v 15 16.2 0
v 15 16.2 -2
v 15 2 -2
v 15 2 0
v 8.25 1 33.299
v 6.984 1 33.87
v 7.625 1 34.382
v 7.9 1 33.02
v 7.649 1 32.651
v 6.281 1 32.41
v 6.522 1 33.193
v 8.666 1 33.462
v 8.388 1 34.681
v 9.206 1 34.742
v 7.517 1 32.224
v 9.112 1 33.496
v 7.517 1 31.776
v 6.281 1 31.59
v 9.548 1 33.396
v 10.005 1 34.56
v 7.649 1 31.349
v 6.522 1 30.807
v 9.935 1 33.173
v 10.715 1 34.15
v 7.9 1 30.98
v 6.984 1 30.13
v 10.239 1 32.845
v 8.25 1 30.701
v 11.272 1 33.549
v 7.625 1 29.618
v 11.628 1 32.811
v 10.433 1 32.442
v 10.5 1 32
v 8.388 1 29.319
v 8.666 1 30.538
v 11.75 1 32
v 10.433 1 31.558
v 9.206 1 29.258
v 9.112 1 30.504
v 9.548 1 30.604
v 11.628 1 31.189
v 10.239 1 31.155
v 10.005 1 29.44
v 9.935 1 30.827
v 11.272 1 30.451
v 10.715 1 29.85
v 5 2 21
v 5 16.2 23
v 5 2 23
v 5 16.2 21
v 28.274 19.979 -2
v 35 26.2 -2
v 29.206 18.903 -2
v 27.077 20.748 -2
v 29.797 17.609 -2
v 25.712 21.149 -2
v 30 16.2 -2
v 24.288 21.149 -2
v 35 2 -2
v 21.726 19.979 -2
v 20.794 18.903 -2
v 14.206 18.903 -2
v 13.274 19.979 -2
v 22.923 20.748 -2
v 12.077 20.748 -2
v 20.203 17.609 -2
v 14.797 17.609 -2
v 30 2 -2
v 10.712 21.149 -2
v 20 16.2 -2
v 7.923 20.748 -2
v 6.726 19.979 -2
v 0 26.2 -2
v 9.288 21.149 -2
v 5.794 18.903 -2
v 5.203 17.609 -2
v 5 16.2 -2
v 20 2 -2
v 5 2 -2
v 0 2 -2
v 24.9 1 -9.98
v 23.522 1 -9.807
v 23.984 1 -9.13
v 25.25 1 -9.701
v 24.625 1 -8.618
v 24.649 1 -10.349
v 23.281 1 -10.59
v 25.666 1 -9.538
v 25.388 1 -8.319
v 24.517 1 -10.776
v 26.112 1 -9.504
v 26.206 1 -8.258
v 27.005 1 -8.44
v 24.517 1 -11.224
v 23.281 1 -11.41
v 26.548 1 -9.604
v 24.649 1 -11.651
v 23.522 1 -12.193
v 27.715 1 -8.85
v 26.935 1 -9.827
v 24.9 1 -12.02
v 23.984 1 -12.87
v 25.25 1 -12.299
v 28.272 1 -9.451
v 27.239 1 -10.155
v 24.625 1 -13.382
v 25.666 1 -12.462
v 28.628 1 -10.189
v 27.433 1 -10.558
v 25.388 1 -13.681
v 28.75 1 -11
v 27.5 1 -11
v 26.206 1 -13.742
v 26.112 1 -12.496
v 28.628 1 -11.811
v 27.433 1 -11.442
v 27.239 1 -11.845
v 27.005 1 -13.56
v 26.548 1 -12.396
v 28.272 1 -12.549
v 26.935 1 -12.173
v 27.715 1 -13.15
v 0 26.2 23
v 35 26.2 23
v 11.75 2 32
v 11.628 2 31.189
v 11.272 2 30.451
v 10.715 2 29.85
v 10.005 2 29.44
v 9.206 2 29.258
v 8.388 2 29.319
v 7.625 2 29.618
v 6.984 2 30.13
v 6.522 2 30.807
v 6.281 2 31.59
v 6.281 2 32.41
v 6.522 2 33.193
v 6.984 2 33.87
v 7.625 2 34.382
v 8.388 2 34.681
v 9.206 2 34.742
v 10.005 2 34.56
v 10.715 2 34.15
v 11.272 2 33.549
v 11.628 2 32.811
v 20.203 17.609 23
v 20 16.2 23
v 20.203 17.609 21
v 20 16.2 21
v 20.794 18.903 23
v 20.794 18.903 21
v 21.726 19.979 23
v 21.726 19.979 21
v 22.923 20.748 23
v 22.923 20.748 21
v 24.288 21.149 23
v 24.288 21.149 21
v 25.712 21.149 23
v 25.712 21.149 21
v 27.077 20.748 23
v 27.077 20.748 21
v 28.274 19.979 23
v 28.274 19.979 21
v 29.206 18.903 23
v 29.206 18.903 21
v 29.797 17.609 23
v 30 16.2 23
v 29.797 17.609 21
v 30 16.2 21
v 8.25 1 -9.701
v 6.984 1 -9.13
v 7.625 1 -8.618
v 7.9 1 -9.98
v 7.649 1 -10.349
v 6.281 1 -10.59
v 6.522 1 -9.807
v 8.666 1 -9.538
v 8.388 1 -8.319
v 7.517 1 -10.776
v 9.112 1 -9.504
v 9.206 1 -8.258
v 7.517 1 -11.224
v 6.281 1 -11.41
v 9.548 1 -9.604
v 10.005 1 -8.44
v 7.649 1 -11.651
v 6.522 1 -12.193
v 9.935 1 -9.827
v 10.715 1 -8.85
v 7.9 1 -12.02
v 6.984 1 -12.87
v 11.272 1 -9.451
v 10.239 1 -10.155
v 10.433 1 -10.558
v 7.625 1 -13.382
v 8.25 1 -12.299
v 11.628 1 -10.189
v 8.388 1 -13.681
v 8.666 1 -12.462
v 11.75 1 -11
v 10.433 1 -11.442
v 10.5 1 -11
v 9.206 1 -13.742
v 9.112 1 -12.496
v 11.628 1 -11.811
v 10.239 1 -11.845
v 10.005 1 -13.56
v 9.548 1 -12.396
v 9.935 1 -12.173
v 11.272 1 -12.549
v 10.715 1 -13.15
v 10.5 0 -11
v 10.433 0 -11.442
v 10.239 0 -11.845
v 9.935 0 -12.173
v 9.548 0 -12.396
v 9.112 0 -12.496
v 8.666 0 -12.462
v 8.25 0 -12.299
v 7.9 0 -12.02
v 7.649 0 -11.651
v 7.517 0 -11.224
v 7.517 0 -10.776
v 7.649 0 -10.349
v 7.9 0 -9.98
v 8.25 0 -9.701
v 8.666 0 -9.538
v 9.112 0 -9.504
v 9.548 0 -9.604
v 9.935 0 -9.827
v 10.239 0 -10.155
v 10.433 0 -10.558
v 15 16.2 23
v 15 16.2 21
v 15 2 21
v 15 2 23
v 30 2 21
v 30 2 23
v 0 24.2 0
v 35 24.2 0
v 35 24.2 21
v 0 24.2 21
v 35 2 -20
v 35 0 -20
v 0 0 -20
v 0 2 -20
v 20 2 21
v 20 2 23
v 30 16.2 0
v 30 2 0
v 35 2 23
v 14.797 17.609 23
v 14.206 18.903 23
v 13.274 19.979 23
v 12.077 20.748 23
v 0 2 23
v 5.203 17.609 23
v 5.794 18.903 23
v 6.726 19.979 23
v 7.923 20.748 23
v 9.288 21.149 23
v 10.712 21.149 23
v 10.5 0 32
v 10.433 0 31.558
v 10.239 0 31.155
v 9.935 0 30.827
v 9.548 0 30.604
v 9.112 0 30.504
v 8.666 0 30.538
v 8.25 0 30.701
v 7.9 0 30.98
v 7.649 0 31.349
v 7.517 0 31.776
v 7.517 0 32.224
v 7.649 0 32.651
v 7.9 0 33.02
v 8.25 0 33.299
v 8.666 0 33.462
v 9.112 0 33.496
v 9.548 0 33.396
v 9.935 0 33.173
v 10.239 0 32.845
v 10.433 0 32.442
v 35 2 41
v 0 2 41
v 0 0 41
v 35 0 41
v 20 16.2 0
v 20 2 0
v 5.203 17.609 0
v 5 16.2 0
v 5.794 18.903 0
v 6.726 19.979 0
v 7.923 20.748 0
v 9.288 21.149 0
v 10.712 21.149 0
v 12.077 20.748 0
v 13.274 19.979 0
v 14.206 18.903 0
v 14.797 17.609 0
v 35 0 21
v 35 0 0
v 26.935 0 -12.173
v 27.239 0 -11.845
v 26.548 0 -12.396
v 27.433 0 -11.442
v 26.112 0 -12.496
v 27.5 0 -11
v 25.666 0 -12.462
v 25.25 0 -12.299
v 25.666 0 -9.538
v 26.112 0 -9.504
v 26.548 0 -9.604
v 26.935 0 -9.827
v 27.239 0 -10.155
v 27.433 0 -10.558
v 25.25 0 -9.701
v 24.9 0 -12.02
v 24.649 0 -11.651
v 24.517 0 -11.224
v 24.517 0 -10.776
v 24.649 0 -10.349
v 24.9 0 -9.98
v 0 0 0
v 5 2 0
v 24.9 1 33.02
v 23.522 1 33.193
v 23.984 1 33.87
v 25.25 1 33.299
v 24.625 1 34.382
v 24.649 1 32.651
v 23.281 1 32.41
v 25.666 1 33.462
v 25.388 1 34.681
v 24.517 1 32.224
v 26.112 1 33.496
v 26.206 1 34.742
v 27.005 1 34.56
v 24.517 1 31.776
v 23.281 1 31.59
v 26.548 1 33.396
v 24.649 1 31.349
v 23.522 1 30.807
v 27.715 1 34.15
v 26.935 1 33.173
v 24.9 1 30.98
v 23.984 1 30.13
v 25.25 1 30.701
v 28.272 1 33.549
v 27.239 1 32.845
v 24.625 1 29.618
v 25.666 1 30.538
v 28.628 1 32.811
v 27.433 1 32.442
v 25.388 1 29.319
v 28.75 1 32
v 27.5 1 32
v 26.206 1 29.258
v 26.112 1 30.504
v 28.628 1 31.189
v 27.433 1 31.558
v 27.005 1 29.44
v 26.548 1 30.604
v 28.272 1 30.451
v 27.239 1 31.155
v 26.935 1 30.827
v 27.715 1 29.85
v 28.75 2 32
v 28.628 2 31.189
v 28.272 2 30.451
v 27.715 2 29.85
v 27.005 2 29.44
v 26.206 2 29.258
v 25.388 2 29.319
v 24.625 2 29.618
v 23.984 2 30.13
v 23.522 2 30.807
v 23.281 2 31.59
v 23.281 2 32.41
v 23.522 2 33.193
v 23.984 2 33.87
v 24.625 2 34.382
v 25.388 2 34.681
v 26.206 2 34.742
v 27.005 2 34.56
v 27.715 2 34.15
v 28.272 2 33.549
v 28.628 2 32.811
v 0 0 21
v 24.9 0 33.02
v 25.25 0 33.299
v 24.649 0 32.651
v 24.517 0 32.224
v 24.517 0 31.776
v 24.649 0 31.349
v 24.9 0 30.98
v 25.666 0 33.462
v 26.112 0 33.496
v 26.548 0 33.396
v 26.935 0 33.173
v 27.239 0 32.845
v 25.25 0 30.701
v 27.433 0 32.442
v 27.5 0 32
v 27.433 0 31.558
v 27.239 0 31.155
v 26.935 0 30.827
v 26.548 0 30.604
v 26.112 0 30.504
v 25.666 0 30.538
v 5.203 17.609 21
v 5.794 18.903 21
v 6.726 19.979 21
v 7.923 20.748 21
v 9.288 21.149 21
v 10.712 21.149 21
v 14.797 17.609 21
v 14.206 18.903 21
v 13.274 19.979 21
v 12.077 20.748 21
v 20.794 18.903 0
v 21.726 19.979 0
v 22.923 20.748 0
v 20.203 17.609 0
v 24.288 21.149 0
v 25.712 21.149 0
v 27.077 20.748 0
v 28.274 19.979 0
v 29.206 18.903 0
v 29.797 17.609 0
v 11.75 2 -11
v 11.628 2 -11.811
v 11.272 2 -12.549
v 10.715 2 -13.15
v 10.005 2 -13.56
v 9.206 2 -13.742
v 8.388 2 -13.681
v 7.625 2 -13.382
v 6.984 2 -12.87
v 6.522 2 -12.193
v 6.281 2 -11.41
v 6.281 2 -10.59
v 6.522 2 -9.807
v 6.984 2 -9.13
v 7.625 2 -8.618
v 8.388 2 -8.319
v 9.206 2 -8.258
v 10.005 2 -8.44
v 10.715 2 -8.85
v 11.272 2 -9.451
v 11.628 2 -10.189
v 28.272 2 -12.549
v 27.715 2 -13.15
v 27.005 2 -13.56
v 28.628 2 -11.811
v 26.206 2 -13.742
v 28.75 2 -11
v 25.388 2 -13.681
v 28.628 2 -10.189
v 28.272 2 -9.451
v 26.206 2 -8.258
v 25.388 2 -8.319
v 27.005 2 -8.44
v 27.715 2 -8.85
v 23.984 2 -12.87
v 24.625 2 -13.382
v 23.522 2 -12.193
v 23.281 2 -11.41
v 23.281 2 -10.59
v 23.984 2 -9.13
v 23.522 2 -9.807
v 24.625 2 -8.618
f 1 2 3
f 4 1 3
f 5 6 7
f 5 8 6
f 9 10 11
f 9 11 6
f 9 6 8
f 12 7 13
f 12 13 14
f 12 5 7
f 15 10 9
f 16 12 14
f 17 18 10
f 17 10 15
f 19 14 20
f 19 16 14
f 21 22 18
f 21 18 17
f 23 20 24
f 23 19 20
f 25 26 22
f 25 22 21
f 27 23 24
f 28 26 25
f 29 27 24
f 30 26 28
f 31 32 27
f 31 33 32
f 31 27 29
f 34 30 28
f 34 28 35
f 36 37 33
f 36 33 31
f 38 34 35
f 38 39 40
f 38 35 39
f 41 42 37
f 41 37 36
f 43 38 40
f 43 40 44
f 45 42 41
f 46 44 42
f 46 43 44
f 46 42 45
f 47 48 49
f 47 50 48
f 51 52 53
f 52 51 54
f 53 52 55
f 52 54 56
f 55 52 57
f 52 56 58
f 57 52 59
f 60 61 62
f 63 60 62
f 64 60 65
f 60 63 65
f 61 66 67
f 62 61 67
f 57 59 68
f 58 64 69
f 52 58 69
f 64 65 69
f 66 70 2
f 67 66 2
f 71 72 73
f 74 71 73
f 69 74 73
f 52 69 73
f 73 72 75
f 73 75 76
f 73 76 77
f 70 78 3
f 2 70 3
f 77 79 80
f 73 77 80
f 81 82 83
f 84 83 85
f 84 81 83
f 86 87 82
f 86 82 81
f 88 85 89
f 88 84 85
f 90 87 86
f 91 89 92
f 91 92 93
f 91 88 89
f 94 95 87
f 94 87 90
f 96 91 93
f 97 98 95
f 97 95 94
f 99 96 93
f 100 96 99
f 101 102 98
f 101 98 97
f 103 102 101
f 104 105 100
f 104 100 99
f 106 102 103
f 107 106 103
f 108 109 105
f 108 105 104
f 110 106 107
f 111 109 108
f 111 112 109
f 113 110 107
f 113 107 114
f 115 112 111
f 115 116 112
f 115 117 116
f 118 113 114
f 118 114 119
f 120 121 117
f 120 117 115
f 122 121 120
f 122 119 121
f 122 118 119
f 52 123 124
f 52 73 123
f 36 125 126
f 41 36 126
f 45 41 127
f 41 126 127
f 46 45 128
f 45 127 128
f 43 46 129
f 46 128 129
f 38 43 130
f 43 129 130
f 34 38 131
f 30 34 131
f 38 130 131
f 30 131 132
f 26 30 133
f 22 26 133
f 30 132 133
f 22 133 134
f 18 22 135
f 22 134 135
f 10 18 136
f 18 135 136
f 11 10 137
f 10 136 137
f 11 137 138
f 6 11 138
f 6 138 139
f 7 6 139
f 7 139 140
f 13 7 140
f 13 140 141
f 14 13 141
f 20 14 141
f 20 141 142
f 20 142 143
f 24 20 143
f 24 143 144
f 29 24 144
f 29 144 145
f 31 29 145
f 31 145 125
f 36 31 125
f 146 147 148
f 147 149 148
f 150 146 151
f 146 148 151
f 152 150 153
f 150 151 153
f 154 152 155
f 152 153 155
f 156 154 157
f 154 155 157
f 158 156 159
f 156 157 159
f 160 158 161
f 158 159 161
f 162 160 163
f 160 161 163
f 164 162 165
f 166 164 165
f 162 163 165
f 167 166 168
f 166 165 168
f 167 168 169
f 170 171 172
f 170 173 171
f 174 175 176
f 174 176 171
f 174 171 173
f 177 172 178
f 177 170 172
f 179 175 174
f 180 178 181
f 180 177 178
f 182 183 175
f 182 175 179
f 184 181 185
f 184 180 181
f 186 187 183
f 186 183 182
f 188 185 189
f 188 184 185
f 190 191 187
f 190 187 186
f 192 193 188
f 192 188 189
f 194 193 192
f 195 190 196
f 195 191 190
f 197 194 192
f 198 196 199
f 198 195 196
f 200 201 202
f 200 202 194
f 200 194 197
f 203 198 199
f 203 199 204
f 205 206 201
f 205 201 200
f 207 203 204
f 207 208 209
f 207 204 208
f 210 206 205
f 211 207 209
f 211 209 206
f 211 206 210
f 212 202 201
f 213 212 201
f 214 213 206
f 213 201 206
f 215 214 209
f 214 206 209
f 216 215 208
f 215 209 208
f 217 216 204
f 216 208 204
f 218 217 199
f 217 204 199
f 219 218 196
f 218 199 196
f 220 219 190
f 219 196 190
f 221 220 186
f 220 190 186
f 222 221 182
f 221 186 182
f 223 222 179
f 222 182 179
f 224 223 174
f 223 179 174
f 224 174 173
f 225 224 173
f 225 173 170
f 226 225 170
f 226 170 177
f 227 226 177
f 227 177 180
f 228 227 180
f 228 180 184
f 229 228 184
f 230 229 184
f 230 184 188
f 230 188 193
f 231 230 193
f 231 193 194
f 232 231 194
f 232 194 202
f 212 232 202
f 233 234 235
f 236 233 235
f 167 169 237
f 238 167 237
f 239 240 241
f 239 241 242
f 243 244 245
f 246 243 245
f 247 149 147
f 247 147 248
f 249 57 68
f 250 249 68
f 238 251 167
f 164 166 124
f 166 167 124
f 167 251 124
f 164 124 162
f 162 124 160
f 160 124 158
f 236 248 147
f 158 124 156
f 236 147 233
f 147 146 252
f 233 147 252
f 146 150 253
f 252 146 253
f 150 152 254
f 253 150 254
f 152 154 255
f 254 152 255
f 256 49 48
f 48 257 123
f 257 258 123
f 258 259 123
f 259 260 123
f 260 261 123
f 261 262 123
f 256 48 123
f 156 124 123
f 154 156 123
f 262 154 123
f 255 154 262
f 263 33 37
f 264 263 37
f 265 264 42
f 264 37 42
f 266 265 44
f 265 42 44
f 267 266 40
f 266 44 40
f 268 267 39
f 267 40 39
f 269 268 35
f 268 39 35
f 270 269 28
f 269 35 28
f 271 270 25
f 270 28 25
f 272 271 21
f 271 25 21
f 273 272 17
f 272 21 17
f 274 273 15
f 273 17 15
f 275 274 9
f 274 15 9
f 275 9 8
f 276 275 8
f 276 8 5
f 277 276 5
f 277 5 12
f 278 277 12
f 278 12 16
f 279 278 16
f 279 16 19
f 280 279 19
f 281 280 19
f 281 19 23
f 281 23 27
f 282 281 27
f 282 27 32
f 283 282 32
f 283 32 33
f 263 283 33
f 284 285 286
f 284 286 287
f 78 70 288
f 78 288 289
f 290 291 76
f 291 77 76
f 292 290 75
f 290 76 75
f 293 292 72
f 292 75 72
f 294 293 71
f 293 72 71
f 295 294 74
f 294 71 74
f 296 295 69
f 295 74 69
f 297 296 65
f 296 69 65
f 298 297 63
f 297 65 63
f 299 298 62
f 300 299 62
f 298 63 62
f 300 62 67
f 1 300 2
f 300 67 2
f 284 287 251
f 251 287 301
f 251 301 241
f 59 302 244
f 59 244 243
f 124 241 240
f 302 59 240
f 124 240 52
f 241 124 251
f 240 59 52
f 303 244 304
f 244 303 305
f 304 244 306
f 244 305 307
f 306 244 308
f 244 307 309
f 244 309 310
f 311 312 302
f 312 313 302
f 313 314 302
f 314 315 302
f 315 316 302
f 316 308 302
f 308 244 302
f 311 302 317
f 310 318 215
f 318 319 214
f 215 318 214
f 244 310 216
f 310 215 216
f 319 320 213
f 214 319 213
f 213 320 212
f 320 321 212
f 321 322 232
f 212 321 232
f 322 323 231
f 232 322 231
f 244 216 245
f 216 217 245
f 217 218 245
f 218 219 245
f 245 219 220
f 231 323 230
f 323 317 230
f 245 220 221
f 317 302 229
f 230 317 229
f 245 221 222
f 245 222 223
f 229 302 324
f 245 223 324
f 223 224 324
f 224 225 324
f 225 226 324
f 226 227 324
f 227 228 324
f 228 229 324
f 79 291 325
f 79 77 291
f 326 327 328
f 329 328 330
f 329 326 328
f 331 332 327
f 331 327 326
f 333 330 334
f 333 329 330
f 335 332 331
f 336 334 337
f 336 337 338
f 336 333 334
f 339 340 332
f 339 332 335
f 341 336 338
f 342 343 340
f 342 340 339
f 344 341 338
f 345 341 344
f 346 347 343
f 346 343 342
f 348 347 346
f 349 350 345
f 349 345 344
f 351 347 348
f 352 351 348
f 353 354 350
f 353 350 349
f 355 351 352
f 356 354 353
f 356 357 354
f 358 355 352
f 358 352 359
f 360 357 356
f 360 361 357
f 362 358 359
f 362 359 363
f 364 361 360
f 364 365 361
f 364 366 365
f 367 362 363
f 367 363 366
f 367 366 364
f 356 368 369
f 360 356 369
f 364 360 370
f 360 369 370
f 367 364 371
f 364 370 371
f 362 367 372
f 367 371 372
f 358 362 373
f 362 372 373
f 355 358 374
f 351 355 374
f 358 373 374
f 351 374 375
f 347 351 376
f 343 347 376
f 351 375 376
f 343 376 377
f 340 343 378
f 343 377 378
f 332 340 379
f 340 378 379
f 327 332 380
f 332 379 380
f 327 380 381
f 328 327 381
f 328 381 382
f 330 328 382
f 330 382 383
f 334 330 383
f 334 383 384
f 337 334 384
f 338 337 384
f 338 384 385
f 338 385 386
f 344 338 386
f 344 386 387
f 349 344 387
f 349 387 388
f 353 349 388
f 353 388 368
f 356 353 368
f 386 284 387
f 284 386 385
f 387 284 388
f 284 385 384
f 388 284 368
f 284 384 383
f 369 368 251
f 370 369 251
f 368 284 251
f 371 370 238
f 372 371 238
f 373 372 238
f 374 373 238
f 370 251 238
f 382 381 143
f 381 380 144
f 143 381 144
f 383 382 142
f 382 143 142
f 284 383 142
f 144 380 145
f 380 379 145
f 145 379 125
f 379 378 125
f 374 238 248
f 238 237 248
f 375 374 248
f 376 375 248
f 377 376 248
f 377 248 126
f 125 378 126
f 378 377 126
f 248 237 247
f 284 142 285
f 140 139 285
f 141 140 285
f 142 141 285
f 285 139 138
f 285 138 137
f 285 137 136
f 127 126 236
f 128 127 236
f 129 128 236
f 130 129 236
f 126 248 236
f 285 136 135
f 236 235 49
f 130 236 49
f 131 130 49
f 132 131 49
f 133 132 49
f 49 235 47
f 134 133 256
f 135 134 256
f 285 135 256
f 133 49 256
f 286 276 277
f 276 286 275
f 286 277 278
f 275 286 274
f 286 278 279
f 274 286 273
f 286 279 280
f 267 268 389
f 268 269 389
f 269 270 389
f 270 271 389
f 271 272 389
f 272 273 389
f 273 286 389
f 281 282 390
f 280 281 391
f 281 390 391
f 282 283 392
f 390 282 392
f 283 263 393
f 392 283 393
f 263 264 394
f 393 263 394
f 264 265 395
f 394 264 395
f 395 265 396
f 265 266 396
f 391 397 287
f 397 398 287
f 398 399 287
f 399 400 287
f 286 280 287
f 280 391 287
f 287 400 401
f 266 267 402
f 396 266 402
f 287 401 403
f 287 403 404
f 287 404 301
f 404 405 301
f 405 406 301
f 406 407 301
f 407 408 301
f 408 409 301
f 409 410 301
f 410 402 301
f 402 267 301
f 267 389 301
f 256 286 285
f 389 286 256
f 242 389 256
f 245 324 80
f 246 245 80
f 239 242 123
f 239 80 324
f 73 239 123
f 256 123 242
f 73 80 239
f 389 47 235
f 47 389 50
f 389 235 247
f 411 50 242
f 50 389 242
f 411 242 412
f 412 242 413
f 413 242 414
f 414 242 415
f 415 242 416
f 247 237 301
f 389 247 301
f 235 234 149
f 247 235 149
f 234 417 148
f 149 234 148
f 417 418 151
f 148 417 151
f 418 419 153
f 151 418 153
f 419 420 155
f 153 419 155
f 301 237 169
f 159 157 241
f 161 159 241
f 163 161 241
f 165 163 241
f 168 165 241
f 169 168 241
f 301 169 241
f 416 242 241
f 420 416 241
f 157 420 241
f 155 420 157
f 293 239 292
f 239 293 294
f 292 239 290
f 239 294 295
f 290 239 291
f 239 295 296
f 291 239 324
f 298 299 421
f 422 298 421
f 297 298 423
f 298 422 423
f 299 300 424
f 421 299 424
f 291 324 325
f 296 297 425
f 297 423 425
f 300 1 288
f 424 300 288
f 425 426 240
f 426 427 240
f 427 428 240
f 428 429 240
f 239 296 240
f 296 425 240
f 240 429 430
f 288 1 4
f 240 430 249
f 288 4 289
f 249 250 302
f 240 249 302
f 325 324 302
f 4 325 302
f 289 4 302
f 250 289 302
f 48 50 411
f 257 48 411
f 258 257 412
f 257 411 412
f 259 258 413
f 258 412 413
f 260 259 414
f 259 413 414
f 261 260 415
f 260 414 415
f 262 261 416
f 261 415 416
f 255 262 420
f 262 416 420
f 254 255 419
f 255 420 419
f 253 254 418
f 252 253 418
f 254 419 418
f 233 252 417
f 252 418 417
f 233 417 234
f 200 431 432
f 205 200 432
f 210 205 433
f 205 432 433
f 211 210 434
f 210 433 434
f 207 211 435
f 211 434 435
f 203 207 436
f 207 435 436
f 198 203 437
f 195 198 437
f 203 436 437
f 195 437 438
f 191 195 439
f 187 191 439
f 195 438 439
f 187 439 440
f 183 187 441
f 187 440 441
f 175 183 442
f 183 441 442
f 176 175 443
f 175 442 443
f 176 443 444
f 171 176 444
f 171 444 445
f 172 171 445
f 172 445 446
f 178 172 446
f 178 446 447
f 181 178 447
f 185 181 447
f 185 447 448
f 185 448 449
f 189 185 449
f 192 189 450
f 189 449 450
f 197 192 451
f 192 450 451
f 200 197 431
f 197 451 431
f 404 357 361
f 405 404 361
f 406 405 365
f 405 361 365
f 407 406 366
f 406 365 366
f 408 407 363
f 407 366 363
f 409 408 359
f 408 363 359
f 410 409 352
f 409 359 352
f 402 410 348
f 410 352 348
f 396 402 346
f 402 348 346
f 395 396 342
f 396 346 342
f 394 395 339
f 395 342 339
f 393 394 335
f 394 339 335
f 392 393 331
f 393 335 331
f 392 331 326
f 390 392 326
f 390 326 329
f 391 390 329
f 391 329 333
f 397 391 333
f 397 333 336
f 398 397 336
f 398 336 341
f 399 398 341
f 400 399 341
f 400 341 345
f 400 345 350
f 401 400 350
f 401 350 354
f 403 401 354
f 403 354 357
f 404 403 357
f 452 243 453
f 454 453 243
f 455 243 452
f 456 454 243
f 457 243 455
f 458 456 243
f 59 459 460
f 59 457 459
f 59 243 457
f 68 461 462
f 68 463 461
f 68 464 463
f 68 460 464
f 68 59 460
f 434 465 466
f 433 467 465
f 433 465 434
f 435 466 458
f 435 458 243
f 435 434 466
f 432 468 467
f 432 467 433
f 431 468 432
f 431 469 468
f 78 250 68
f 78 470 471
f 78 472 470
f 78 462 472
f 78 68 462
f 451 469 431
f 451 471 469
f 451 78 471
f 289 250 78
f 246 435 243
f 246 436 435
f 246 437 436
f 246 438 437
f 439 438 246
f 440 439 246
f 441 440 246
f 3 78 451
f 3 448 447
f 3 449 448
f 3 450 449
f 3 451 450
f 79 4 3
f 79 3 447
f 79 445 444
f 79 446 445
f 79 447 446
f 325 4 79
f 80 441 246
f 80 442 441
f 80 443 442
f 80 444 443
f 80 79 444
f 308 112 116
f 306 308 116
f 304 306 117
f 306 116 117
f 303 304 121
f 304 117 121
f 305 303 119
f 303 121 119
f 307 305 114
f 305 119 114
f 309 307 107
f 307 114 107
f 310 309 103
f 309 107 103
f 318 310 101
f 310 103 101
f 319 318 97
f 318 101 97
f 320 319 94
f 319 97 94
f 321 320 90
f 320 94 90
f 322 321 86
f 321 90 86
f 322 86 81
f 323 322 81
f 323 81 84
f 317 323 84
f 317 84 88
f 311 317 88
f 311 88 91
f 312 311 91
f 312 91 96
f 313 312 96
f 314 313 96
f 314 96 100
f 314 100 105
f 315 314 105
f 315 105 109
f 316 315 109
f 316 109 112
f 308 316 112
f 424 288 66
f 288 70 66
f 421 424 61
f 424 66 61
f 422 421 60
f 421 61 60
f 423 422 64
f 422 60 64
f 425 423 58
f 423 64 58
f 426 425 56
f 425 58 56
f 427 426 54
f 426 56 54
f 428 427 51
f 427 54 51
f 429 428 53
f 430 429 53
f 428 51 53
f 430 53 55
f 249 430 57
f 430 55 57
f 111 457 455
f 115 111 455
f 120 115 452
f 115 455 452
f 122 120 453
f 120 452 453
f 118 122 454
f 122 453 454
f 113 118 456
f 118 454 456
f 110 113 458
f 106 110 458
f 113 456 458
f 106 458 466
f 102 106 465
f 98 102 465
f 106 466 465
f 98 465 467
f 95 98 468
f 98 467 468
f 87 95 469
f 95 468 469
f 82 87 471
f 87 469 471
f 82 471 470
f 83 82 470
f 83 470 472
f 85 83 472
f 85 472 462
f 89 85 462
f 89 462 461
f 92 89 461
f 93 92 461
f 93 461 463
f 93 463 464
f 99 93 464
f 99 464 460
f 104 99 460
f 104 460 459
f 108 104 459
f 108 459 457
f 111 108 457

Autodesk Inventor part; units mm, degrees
ref_plane "YZ Plane" through (0, 0, 0) normal (1, 0, 0) x (0, 1, 0)
ref_plane "XZ Plane" through (0, 0, 0) normal (0, 1, 0) x (-1, 0, 0)
ref_plane "XY Plane" through (0, 0, 0) normal (0, 0, 1) x (1, 0, 0)
sketch "Sketch1" plane through (0, 0, 0) normal (0, 1, 0) x (-1, 0, 0)
  line L0 (0, 0) -> (-35, 0)
  line L1 (-35, 0) -> (-35, -20)
  line L2 (-35, -20) -> (0, -20)
  line L3 (0, -20) -> (0, 0)
  dimension "d0" = 35
  dimension "d1" = 20
extrude "Extrusion1" add sketch "Sketch1" along normal blind 2
sketch "Sketch2" plane through (0, 2, 0) normal (0, 1, 0) x (1, 0, 0)
  line L0 (0, 20) -> (0, 0) projected
  line L1 (35, 0) -> (35, 20) projected
  line L2 (0, 0) -> (35, 0)
  line L3 (35, 0) -> (35, 2)
  line L4 (35, 2) -> (0, 2)
  line L5 (0, 2) -> (0, 0)
  dimension "d4" = 2
extrude "Extrusion2" add sketch "Sketch2" along normal blind 24.2
sketch "Sketch3" plane through (0, 0, 0) normal (0, 0, 1) x (1, 0, 0)
  line L0 (0, 0) -> (0, 26.2) projected
  line L1 (35, 0) -> (35, 26.2) projected
  line L2 (0, 26.2) -> (35, 26.2)
  line L3 (35, 26.2) -> (35, 24.2)
  line L4 (35, 24.2) -> (0, 24.2)
  line L5 (0, 24.2) -> (0, 26.2)
  dimension "d7" = 2
extrude "Extrusion3" add sketch "Sketch3" along normal blind 23
sketch "Sketch4" plane through (0, 24.2, 0) normal (0, -1, 0) x (1, 0, 0)
  line L0 (35, -2) -> (35, 23) projected
  line L1 (0, 0) -> (0, 23) projected
  line L2 (35, 23) -> (0, 23)
  line L3 (0, 23) -> (0, 21)
  line L4 (0, 21) -> (35, 21)
  line L5 (35, 21) -> (35, 23)
  dimension "d10" = 2
extrude "Extrusion4" add sketch "Sketch4" along normal blind 24.2
sketch "Sketch5" plane through (0, 0, 23) normal (0, 0, 1) x (1, 0, 0)
  line L0 (0, 0) -> (0, 2) projected
  line L1 (35, 2) -> (0, 2) projected
  line L2 (0, 0) -> (35, 0)
  line L3 (35, 0) -> (35, 2)
  line L4 (35, 2) -> (0, 2)
  line L5 (0, 2) -> (0, 0)
extrude "Extrusion5" add sketch "Sketch5" along normal blind 18
sketch "Sketch6" plane through (0, 2, 0) normal (0, 1, 0) x (1, 0, 0)
  circle A0 centre (26, 11) radius 1.5
  line L0 (35, 20) -> (0, 20) projected
  line L1 (35, 2) -> (35, 20) projected
  circle A1 centre (9, 11) radius 1.5
  circle A2 centre (26, 11) radius 2.75
  circle A3 centre (9, 11) radius 2.75
  point P0 (0, 0)
  dimension "d15" = 3
  dimension "d16" = 9
  dimension "d17" = 9
  dimension "d18" = 3
  dimension "d19" = 17
  dimension "d20" = 5.5
  dimension "d21" = 5.5
extrude "Extrusion6" cut sketch "Sketch6" against normal blind 2 contours A0 | A1
extrude "Extrusion7" cut sketch "Sketch6" against normal blind 1
sketch "Sketch7" plane through (0, 2, 23) normal (0, 1, 0) x (1, 0, 0)
  circle A0 centre (26, -9) radius 1.5
  line L0 (35, -18) -> (0, -18) projected
  line L1 (35, 0) -> (35, -18) projected
  circle A1 centre (9, -9) radius 1.5
  circle A2 centre (26, -9) radius 2.75
  circle A3 centre (9, -9) radius 2.75
  point P0 (0, 23)
  dimension "d26" = 3
  dimension "d27" = 9
  dimension "d28" = 9
  dimension "d29" = 3
  dimension "d30" = 17
  dimension "d31" = 5.5
  dimension "d32" = 5.5
extrude "Extrusion8" cut sketch "Sketch7" against normal blind 2 contours A0 | A1
extrude "Extrusion9" cut sketch "Sketch7" against normal blind 1
sketch "Sketch8" plane through (35, 2, -2) normal (0, 0, -1) x (-1, 0, 0)
  arc A0 (15, 14.2) -> (5, 14.2) centre (10, 14.2) ccw
  line L0 (0, 24.2) -> (35, 24.2) projected
  line L1 (0, 0) -> (0, 24.2) projected
  line L2 (17.5, 24.2) -> (17.5, 0)
  line L3 (35, 0) -> (0, 0) projected
  line L4 (5, 14.2) -> (5, -0.3272)
  line L5 (15, 14.2) -> (15, 0)
  arc A1 (30, 14.2) -> (20, 14.2) centre (25, 14.2) ccw
  line L6 (30, 14.2) -> (30, -0.3272)
  line L7 (20, 14.2) -> (20, 0)
  point P0 (35, -2)
  point P1 (20, 0)
  point P2 (30, 0)
  point P3 (5, 0)
  dimension "d37" = 10
  dimension "d38" = 10
  dimension "d39" = 10
extrude "Extrusion10" cut sketch "Sketch8" against normal blind 25 contours L5 L3 L4 A0 | L7 A1 L6 L3
properties part number "Bracket Motor_3DPrint"
